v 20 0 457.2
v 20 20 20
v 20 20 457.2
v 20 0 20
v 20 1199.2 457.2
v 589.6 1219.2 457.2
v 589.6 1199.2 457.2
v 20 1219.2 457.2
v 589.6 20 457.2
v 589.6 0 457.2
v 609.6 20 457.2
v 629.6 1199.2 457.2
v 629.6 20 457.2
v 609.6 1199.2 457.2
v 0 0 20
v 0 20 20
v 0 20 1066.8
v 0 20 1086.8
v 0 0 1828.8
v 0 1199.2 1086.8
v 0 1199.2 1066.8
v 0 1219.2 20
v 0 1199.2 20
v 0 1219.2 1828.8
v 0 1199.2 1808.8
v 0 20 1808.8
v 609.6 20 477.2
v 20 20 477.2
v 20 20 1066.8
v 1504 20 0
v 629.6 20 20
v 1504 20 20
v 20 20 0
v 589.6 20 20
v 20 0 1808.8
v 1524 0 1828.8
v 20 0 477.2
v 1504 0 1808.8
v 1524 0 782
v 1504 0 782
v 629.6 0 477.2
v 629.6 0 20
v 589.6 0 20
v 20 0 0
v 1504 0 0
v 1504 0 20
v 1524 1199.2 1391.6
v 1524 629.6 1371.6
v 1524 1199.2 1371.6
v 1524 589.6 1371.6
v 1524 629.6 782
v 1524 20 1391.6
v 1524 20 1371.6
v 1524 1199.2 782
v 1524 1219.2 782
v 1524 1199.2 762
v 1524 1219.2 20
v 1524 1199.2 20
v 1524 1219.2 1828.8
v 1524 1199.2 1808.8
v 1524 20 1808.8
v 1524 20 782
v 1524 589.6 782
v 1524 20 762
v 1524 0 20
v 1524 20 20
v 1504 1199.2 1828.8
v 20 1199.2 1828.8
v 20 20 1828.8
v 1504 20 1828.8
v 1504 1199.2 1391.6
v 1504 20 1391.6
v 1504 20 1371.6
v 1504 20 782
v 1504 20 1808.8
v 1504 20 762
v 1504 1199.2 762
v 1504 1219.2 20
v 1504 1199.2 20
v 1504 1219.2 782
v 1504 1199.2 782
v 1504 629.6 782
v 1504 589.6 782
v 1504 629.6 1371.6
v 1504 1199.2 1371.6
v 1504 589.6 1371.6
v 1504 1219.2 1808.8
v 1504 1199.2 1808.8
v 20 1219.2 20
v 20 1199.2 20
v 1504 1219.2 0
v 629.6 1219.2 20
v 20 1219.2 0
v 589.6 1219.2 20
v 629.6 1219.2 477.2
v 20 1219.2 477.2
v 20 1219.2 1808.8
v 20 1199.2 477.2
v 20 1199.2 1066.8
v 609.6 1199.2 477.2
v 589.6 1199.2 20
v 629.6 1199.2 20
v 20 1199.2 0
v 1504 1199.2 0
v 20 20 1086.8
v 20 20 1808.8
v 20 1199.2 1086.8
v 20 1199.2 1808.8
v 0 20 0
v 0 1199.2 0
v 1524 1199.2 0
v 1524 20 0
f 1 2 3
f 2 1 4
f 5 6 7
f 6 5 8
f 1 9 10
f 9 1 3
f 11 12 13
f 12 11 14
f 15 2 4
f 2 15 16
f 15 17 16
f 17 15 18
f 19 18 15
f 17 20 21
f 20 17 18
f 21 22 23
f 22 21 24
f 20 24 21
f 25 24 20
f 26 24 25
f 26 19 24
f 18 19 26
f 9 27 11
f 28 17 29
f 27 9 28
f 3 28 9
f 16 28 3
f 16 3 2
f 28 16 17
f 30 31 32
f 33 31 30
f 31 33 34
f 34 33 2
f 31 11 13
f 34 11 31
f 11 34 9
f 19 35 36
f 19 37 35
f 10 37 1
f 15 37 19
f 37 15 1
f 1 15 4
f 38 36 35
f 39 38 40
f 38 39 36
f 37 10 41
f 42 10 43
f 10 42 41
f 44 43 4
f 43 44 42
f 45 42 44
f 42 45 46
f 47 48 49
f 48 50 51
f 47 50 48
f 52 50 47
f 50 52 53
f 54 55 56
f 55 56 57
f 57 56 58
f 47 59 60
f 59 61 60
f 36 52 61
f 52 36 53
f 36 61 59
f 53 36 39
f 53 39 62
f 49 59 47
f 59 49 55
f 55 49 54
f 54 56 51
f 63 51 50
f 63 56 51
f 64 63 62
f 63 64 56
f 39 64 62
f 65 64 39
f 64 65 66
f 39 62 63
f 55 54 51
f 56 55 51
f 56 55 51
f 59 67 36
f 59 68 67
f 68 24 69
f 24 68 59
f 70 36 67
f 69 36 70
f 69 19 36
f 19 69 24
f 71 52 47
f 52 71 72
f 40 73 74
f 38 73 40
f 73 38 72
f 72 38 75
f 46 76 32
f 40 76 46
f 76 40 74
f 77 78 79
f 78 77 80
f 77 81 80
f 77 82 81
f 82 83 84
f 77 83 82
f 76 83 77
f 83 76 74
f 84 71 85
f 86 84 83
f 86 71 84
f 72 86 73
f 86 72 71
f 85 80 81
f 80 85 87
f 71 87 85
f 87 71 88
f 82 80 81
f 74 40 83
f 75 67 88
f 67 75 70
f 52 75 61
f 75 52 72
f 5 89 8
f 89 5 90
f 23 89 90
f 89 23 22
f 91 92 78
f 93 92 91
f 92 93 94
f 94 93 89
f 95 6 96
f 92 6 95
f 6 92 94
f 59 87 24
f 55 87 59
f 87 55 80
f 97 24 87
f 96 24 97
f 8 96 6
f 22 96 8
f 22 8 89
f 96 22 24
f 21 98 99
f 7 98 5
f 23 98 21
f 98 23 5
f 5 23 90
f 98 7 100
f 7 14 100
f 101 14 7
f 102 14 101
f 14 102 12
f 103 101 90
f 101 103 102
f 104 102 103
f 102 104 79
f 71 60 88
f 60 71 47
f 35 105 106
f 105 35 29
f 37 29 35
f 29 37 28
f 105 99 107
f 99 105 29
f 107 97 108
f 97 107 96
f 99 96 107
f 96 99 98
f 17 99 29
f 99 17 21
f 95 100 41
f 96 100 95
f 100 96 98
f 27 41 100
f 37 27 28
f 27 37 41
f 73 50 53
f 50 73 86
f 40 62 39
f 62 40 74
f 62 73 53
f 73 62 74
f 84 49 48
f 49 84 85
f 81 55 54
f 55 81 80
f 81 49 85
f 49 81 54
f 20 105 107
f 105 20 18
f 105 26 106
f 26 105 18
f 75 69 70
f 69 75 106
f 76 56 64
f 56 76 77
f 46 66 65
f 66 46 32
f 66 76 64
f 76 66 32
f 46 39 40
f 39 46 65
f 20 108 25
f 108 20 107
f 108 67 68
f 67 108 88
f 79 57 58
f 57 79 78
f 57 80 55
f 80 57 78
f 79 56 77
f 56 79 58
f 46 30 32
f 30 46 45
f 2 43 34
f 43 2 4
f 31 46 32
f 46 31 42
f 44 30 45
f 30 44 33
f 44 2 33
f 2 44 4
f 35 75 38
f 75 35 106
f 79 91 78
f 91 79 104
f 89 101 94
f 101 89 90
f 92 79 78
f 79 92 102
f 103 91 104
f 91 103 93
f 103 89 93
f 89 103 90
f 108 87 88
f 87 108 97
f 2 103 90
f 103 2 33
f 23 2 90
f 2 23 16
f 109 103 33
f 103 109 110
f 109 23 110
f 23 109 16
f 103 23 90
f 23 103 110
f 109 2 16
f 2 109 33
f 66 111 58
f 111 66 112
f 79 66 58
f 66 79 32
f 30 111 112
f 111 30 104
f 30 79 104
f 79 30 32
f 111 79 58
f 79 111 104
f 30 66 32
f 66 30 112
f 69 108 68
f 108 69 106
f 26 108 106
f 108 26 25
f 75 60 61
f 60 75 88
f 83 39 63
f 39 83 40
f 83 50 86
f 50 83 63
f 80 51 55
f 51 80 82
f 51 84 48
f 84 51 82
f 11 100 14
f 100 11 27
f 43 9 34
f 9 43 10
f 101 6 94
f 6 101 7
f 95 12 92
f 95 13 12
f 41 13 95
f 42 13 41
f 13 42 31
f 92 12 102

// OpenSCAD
tx=feet(5);
ty=feet(4);
tz=feet(6);
sections=[1.5,2,2.5];
for(y=[0,ty-20],x=[0,tx-20]) translate([x,y,20+(x==0?0:tz-feet(sections[0]))]) color("blue") tube(feet(sections[0])-20,2);
for(y=[0,ty-20],x=[0,tx-20]) translate([x,y,20+(x==0?feet(1.5):tz-feet(sections[0])-feet(sections[1]))]) color("green") tube(feet(sections[1])-20,2);
for(y=[0,ty-20],x=[0,tx-20]) translate([x,y,20+(x==0?feet(sections[0])+feet(sections[1]):0)]) color("red") tube(feet(sections[2])-20,2);
for(y=[0,ty-20],z=[0,tz-20]) translate([20,y,z]) tube(tx-40);
for(z=[0,tz-20],x=[0,tx-20]) translate([x,20,z]) tube(ty-40,1);
for(yo=[0,ty/2+20],zf=[2.5,4.5]) translate([tx-20,yo,feet(zf)]) color("purple") tube(ty/2-20,1);
for(yo=[-20,0]) translate([tx-20,ty/2+yo,feet(2.5)]) tube(feet(2)+20,2);
for(yo=[0,ty/2]) translate([0,yo,feet(sections[0])+feet(sections[1])]) color(yo==0?"teal":"aqua") tube(ty/2,1);
for(y=[0,ty-20]) translate([0,y,feet(1.5)]) tube(feet(2));
translate([feet(2),0,feet(1.5)]) color("blue") tube(ty,1);
for(xo=[-20,0],y=[0,ty-20]) translate([feet(2)+xo,y,20]) tube(feet(1.5)-20,2);

module tube(length,dir="x")
{
  cube([
    dir==0||dir=="x"?length:20,
    dir==1||dir=="y"?length:20,
    dir==2||dir=="z"?length:20
  ]);
}
function feet(mm) = 25.4*12*mm;
